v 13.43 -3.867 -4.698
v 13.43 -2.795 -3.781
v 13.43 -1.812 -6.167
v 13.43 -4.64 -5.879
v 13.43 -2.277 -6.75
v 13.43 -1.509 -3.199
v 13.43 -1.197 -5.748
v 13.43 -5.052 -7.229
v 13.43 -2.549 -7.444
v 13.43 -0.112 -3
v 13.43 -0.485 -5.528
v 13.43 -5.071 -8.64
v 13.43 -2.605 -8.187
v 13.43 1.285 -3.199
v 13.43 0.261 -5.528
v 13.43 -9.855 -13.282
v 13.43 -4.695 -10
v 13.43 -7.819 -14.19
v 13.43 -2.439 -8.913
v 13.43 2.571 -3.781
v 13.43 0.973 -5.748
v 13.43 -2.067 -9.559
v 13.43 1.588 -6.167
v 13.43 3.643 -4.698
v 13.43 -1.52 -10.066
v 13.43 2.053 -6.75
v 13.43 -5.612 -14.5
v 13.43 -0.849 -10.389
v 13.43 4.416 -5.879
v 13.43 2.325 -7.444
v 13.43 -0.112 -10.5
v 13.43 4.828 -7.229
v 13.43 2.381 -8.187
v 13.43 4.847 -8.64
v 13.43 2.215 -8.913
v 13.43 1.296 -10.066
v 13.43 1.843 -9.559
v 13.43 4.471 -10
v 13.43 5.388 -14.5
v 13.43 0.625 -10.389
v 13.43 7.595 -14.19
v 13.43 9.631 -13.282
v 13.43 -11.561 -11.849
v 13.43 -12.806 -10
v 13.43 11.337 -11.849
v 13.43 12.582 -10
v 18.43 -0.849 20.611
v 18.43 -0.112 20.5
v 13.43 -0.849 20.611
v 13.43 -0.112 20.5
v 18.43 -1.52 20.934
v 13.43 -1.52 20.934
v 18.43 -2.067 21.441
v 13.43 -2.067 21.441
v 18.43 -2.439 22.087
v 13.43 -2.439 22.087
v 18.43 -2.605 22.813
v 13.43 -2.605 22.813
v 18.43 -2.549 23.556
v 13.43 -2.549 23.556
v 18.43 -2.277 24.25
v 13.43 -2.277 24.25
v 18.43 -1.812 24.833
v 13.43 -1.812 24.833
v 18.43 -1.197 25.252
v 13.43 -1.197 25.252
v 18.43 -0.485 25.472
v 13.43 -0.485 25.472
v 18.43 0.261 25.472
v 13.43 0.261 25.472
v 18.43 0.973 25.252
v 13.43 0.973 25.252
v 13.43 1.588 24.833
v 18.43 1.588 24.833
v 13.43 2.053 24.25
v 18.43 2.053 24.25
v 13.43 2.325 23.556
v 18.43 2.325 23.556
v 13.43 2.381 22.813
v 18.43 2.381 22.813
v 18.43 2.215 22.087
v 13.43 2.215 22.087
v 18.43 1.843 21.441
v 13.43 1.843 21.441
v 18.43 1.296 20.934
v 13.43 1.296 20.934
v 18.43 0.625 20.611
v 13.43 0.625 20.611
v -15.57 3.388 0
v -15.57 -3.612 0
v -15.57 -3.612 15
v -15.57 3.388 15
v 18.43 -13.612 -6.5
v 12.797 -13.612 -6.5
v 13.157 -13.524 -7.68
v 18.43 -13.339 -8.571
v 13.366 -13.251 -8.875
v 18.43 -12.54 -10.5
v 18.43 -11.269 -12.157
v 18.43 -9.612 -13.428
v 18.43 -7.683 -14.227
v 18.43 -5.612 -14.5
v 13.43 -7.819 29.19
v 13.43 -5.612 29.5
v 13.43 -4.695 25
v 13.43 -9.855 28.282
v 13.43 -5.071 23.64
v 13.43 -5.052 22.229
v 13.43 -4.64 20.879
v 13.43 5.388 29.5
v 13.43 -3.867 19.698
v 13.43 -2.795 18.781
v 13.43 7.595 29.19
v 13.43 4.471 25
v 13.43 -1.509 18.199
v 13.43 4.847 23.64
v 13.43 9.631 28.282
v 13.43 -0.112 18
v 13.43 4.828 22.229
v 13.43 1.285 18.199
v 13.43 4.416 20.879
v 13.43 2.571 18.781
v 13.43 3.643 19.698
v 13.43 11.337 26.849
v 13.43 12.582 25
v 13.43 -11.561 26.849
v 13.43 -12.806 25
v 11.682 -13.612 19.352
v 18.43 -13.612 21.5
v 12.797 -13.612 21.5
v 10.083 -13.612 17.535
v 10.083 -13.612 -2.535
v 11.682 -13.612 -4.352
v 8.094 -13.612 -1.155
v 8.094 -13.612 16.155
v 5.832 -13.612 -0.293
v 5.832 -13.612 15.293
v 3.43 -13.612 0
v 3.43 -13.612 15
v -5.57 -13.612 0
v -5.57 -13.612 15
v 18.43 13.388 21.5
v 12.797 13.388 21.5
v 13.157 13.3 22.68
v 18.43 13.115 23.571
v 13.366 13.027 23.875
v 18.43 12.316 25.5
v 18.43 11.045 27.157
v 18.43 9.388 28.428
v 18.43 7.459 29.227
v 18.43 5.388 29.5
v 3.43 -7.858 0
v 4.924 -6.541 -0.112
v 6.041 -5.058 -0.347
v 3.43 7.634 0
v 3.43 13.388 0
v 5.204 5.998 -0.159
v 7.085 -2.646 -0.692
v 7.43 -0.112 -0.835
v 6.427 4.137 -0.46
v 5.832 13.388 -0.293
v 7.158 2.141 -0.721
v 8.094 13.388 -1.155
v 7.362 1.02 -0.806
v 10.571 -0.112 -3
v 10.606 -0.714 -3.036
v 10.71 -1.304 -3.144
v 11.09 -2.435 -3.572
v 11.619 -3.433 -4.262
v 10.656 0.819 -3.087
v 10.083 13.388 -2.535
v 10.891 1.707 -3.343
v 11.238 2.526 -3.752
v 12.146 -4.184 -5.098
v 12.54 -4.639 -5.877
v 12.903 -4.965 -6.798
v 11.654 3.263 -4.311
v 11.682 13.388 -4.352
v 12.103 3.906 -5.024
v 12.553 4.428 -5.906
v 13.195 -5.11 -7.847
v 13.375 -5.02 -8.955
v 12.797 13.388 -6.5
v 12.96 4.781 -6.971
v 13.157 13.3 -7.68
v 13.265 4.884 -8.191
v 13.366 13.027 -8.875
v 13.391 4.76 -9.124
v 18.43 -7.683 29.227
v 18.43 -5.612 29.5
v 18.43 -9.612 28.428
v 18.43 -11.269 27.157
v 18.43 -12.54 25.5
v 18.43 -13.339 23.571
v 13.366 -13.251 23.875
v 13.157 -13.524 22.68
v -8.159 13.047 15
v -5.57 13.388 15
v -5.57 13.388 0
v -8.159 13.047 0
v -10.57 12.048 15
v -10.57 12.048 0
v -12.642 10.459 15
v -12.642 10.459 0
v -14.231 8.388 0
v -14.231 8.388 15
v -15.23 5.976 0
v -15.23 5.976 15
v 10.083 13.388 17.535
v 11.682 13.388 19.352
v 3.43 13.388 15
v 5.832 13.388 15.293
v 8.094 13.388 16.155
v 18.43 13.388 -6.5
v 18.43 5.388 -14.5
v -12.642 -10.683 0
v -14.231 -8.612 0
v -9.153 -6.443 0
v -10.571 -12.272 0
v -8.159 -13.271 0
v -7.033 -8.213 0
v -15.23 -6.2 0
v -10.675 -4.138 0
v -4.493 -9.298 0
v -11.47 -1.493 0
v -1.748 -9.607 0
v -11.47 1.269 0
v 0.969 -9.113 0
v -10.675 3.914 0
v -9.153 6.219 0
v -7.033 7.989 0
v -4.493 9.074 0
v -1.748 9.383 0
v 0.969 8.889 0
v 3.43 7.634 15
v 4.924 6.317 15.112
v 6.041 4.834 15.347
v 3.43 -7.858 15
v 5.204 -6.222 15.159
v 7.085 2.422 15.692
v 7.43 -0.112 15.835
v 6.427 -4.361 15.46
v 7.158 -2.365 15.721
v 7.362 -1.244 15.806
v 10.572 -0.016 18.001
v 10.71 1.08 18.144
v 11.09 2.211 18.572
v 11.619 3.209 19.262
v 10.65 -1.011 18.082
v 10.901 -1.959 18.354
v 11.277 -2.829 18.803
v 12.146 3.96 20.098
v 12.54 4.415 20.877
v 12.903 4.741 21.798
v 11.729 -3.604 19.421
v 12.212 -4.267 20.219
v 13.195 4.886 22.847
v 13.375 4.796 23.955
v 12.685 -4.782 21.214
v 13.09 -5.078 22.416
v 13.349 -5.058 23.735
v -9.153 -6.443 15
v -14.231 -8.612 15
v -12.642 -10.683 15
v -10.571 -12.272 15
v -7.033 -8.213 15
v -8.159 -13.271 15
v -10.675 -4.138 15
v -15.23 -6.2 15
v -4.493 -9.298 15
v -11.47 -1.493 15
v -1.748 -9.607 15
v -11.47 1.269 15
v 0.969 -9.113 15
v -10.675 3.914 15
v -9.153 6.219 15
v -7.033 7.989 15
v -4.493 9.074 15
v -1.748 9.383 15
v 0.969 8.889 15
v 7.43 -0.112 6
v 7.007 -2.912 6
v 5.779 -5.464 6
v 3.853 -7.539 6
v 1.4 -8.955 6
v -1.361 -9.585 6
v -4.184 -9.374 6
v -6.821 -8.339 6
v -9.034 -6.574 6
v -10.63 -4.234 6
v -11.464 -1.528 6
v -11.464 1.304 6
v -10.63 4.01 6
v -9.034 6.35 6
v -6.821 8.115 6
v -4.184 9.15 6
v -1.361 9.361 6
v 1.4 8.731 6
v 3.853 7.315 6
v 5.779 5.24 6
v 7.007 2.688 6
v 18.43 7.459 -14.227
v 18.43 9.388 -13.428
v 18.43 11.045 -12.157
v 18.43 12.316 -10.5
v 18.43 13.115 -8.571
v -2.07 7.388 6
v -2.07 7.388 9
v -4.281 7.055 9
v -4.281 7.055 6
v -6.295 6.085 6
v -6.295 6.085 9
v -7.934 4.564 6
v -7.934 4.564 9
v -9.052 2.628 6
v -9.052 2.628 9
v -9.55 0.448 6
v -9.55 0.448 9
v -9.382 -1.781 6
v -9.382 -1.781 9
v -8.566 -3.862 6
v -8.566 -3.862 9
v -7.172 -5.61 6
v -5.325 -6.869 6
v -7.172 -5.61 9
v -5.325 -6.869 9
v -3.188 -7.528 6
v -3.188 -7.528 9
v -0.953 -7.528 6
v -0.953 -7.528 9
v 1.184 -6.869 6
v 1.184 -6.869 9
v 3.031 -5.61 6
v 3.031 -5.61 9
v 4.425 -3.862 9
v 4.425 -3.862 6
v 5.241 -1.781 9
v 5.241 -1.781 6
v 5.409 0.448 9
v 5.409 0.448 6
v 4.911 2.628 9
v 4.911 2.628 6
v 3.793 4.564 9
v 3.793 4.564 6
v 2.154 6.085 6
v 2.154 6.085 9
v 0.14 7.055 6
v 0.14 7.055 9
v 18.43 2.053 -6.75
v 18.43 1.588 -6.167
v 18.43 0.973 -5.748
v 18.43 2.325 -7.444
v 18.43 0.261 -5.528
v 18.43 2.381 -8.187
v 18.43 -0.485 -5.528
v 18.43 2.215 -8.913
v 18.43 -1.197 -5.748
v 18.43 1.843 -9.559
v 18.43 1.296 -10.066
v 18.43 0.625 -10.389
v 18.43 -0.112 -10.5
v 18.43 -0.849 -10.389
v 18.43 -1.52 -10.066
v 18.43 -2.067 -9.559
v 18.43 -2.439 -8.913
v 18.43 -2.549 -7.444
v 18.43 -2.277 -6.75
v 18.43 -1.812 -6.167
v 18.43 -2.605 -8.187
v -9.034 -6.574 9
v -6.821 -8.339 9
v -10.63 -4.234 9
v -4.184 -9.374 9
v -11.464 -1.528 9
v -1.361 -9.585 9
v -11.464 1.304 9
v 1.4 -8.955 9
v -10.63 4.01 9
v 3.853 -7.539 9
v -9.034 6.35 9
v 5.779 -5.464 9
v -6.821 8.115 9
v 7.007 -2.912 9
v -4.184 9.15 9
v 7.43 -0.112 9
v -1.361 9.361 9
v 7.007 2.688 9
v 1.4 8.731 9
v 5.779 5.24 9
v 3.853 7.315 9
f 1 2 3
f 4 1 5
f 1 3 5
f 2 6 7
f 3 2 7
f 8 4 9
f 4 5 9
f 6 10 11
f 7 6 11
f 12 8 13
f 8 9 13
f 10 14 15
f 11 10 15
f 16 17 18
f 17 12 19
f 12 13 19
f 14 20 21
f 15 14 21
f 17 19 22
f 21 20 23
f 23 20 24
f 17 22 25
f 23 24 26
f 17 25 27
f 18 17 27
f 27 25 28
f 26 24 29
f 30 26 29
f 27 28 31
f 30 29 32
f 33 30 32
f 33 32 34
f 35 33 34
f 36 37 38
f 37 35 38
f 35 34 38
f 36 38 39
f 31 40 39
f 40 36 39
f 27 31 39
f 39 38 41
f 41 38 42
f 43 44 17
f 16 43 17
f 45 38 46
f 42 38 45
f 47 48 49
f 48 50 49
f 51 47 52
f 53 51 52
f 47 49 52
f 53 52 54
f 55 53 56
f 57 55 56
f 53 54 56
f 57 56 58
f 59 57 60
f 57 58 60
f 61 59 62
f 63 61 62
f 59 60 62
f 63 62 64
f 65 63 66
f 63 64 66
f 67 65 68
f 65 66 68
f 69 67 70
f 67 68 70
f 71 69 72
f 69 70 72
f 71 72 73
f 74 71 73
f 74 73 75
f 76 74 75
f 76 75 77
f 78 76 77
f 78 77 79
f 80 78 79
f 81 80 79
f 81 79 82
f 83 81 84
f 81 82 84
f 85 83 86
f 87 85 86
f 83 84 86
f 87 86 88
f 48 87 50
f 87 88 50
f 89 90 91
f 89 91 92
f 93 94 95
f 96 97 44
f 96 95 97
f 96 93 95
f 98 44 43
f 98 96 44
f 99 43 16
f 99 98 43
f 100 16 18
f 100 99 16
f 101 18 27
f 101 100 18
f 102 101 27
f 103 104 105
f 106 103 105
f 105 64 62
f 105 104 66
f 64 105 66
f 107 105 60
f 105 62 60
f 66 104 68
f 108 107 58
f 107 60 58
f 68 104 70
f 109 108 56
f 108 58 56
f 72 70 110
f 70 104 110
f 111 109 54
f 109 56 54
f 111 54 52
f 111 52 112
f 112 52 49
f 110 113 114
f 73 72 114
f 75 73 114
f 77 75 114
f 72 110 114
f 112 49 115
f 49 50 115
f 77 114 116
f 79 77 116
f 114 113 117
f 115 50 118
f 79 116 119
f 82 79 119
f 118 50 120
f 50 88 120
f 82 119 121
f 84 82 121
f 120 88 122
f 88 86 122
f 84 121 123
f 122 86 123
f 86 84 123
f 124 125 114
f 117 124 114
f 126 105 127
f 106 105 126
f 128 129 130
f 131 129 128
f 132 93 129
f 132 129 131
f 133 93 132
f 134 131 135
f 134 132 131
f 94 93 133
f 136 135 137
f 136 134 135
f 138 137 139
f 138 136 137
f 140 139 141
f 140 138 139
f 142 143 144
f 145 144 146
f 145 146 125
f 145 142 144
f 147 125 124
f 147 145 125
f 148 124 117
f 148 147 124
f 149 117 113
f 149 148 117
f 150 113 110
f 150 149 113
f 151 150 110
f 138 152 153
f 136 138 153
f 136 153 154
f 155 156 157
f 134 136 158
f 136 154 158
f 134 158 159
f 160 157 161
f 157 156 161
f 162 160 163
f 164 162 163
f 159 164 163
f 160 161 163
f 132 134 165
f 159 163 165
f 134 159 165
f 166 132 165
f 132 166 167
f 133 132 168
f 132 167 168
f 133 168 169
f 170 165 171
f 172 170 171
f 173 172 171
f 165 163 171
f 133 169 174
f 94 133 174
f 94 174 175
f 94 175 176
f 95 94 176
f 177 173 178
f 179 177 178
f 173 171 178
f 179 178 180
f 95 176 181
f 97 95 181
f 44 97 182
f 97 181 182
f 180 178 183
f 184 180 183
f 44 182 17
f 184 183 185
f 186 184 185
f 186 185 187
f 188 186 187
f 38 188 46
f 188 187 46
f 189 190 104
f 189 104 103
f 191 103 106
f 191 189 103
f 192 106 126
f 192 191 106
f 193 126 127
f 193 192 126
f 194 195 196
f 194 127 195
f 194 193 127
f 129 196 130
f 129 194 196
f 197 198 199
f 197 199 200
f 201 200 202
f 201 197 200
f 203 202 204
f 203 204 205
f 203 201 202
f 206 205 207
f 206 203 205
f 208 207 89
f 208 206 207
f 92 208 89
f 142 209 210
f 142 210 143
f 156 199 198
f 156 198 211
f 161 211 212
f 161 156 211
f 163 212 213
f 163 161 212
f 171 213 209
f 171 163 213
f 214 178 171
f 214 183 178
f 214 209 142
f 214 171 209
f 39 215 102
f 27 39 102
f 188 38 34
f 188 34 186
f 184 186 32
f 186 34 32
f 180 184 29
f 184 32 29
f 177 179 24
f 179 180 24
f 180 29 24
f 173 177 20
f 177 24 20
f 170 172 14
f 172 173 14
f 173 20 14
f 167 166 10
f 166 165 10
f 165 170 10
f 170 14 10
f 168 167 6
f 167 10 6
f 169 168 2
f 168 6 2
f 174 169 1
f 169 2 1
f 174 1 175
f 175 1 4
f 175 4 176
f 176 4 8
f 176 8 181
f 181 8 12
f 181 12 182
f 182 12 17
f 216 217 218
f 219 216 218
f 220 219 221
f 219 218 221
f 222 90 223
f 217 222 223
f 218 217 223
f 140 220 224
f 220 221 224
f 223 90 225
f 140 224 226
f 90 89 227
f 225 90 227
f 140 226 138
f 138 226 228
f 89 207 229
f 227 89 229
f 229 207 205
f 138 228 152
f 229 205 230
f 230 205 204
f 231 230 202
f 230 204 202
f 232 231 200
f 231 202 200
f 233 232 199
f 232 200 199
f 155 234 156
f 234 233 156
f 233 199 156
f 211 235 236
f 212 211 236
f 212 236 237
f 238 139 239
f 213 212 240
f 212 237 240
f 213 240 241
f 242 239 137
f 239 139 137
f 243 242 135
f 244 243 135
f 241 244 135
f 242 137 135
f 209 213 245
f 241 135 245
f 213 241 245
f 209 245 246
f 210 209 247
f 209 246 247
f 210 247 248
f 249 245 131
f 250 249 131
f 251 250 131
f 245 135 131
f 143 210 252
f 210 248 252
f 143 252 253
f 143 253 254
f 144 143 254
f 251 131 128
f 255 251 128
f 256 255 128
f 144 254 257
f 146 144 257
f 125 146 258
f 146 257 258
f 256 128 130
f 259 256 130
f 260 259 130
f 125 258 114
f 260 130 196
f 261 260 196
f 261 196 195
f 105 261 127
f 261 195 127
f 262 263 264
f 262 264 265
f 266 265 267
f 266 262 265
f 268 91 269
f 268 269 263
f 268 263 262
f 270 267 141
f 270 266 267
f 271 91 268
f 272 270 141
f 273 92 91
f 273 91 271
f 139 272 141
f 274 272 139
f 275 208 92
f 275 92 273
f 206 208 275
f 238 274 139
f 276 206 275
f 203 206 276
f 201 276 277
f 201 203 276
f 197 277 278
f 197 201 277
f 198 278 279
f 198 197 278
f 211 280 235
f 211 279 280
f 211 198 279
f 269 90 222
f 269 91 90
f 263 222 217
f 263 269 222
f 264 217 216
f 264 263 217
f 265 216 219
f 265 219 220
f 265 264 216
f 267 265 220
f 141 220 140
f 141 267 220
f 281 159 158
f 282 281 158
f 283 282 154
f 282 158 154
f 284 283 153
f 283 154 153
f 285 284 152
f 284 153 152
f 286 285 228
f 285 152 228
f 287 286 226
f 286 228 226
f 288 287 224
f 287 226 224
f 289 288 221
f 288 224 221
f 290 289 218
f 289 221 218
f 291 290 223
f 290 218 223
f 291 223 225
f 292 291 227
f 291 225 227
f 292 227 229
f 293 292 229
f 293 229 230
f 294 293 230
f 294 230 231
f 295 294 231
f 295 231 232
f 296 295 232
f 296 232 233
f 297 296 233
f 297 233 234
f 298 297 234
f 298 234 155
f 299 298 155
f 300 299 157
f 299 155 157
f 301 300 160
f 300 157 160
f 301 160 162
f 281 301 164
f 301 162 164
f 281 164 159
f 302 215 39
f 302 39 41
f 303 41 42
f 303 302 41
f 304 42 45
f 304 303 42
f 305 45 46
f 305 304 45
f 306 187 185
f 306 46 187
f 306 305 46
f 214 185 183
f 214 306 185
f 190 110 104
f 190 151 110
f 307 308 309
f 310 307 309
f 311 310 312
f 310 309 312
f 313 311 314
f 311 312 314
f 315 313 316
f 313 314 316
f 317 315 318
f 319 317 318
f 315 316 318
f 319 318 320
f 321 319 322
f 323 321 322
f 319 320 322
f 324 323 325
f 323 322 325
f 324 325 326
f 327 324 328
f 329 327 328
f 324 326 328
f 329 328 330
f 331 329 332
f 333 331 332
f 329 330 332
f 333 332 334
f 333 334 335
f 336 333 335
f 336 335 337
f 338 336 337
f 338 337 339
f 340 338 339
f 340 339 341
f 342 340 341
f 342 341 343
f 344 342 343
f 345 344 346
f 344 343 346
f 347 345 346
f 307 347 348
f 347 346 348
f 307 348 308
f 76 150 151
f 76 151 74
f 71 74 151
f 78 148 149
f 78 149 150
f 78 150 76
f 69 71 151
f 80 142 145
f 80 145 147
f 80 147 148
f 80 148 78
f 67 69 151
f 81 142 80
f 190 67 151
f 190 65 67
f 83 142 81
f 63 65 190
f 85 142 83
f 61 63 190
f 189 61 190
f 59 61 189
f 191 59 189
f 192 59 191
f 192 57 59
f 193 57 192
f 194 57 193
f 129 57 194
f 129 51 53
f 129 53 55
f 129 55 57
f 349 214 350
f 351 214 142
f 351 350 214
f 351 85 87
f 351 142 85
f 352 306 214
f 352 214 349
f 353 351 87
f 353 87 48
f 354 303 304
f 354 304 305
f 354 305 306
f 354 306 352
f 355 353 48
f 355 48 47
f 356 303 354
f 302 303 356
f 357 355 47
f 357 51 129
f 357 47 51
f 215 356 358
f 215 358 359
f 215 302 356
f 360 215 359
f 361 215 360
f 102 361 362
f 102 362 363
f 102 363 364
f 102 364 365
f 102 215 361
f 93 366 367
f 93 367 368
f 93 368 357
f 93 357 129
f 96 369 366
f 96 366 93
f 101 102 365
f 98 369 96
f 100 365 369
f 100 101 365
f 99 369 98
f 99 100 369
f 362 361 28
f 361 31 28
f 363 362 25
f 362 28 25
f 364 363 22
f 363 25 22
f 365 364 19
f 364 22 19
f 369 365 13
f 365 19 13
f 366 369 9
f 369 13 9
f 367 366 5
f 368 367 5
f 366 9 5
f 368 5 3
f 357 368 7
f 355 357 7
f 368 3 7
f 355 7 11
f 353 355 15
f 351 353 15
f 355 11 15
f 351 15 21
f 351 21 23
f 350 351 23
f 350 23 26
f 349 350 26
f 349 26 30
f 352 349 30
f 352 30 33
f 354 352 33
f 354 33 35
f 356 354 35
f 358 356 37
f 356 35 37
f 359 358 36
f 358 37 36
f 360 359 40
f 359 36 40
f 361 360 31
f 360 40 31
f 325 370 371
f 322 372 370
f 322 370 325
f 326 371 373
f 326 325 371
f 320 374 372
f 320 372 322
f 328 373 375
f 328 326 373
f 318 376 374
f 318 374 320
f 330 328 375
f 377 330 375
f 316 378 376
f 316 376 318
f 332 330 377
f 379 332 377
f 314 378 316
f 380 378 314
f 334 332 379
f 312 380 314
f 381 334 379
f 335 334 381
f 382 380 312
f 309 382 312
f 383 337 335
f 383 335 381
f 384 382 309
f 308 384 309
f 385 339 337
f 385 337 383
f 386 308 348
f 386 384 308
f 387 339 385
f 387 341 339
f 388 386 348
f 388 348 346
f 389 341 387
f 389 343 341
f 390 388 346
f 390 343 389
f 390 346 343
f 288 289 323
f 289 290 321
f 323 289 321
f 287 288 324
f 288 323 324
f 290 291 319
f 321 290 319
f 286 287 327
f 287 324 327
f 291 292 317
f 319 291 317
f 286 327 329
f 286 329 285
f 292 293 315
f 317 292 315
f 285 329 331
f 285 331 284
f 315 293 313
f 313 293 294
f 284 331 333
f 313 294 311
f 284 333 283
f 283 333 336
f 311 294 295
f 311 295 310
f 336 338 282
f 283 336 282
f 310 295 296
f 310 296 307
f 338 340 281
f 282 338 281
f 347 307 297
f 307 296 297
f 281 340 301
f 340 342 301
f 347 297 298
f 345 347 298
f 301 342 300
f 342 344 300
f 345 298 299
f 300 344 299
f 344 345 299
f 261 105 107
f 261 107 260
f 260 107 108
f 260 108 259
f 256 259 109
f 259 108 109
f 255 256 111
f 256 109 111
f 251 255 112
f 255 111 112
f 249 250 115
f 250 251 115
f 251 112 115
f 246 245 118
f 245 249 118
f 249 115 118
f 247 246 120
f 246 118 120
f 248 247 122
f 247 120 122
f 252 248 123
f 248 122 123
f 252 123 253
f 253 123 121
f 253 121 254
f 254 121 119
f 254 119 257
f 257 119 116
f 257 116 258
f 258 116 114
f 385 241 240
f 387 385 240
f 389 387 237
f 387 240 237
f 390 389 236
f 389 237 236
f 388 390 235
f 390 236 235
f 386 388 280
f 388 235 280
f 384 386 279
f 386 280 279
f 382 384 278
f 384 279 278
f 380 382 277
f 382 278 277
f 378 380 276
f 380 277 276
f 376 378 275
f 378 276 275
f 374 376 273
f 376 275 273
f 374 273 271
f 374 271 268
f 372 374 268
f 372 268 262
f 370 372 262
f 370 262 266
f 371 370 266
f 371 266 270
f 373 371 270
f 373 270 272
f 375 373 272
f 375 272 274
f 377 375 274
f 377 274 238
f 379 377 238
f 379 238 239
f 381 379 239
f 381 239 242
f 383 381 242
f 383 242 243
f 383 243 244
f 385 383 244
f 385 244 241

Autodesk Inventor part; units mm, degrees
ref_plane "YZ Plane" through (0, 0, 0) normal (1, 0, 0) x (0, 1, 0)
ref_plane "XZ Plane" through (0, 0, 0) normal (0, 1, 0) x (-1, 0, 0)
ref_plane "XY Plane" through (0, 0, 0) normal (0, 0, 1) x (1, 0, 0)
sketch "Szkic1" plane through (0, 0, 0) normal (0, 0, 1) x (1, 0, 0)
  line L0 (-15.5705, 13.388) -> (18.4295, 13.388)
  line L1 (18.4295, 13.388) -> (18.4295, -13.612)
  line L2 (18.4295, -13.612) -> (-15.5705, -13.612)
  line L3 (-15.5705, -13.612) -> (-15.5705, 13.388)
  circle A0 centre (-2.0705, -0.112) radius 9.5
  point P0 (0, 0)
  dimension "d0" = 27
  dimension "d1" = 34
  dimension "d2" = 20.5
  dimension "d3" = 13.5
  dimension "d4" = 19
extrude "Wyciągnięcie proste1" add sketch "Szkic1" along normal blind 15 contours L0 L1 L2 L3 | A0
extrude "Wyciągnięcie proste2" cut sketch "Szkic1" along normal blind 6 contours A0
sketch "Szkic2" plane through (0, 0, 15) normal (0, 0, 1) x (1, 0, 0)
  circle A0 centre (-2.0705, -0.112) radius 9.5 projected
  line L0 (18.4295, 13.388) -> (-15.5705, 13.388) projected
  line L1 (-15.5705, 13.388) -> (-15.5705, -13.612) projected
  line L2 (-15.5705, -13.612) -> (18.4295, -13.612) projected
  line L3 (18.4295, -13.612) -> (18.4295, 13.388) projected
  point P0 (0, 0)
extrude "Wyciągnięcie proste3" cut sketch "Szkic2" against normal blind 6 contours A0
hole "Otwór1" at (-2.0705, -0.112, 0) direction (0, 0, 1) diameter 15 end through all
fillet "Zaokrąglenie1" radius 10 2 edges at (-15.5705, 13.388, 7.5) (-15.5705, -13.612, 7.5)
sketch "Szkic3" plane through (18.4295, -13.612, 0) normal (1, 0, 0) x (0, 0, -1)
  line L0 (0, 27) -> (0, 0) projected
  line L1 (0, 27) -> (-15, 27) projected
  line L2 (-15, 0) -> (-15, 27) projected
  line L3 (0, 0) -> (-15, 0) projected
  line L4 (-15, 27) -> (-29.5, 27)
  line L5 (-29.5, 27) -> (-29.5, 0)
  line L6 (-29.5, 0) -> (-15, 0)
  line L7 (0, 27) -> (14.5, 27)
  line L8 (14.5, 27) -> (14.5, 0)
  line L9 (14.5, 0) -> (0, 0)
  point P0 (0, 13.612)
  point P1 (-23, 13.5)
  point P2 (8, 13.5)
  dimension "d21" = 14.5
  dimension "d22" = 14.5
  dimension "d23" = 6.5
  dimension "d24" = 6.5
  dimension "d25" = 27
  dimension "d26" = 13.5
  dimension "d27" = 13.5
extrude "Wyciągnięcie proste4" add sketch "Szkic3" against normal blind 5 contours L7 L8 L9 L0 | L2 L6 L5 L4
hole "Otwór2" at (18.4295, -0.112, 23) at (18.4295, -0.112, -8) direction (-1, 0, 0) diameter 5 end through all
fillet "Zaokrąglenie2" radius 10 2 edges at (13.4295, -0.112, 15) (13.4295, -0.112, 0)
fillet "Zaokrąglenie3" radius 8 4 edges at (15.9295, 13.388, -14.5) (15.9295, -13.612, -14.5) (15.9295, -13.612, 29.5) (15.9295, 13.388, 29.5)
sketch "Szkic4" plane through (13.4295, -13.612, 0) normal (-1, 0, 0) x (0, 0, 1)
  arc A0 (-10, 15) -> (-10, 12) centre (-8, 13.5) ccw projected
  arc A1 (25, 12) -> (25, 15) centre (23, 13.5) ccw projected
  circle A2 centre (-8, 13.5) radius 5
  circle A3 centre (23, 13.5) radius 5
  point P0 (0, 13.612)
  dimension "d37" = 10
  dimension "d38" = 10
extrude "Wyciągnięcie proste5" cut sketch "Szkic4" along normal blind 5
equation "\"d3\" = 0.5 * d0"
equation "\"d24\" = d23"
equation "\"d26\" = 0.5 * d25"
equation "\"d27\" = d26"
properties part number "3DP_ABS_Y_Axis_Pulley_Rod_Mid_Bearing_Block"
